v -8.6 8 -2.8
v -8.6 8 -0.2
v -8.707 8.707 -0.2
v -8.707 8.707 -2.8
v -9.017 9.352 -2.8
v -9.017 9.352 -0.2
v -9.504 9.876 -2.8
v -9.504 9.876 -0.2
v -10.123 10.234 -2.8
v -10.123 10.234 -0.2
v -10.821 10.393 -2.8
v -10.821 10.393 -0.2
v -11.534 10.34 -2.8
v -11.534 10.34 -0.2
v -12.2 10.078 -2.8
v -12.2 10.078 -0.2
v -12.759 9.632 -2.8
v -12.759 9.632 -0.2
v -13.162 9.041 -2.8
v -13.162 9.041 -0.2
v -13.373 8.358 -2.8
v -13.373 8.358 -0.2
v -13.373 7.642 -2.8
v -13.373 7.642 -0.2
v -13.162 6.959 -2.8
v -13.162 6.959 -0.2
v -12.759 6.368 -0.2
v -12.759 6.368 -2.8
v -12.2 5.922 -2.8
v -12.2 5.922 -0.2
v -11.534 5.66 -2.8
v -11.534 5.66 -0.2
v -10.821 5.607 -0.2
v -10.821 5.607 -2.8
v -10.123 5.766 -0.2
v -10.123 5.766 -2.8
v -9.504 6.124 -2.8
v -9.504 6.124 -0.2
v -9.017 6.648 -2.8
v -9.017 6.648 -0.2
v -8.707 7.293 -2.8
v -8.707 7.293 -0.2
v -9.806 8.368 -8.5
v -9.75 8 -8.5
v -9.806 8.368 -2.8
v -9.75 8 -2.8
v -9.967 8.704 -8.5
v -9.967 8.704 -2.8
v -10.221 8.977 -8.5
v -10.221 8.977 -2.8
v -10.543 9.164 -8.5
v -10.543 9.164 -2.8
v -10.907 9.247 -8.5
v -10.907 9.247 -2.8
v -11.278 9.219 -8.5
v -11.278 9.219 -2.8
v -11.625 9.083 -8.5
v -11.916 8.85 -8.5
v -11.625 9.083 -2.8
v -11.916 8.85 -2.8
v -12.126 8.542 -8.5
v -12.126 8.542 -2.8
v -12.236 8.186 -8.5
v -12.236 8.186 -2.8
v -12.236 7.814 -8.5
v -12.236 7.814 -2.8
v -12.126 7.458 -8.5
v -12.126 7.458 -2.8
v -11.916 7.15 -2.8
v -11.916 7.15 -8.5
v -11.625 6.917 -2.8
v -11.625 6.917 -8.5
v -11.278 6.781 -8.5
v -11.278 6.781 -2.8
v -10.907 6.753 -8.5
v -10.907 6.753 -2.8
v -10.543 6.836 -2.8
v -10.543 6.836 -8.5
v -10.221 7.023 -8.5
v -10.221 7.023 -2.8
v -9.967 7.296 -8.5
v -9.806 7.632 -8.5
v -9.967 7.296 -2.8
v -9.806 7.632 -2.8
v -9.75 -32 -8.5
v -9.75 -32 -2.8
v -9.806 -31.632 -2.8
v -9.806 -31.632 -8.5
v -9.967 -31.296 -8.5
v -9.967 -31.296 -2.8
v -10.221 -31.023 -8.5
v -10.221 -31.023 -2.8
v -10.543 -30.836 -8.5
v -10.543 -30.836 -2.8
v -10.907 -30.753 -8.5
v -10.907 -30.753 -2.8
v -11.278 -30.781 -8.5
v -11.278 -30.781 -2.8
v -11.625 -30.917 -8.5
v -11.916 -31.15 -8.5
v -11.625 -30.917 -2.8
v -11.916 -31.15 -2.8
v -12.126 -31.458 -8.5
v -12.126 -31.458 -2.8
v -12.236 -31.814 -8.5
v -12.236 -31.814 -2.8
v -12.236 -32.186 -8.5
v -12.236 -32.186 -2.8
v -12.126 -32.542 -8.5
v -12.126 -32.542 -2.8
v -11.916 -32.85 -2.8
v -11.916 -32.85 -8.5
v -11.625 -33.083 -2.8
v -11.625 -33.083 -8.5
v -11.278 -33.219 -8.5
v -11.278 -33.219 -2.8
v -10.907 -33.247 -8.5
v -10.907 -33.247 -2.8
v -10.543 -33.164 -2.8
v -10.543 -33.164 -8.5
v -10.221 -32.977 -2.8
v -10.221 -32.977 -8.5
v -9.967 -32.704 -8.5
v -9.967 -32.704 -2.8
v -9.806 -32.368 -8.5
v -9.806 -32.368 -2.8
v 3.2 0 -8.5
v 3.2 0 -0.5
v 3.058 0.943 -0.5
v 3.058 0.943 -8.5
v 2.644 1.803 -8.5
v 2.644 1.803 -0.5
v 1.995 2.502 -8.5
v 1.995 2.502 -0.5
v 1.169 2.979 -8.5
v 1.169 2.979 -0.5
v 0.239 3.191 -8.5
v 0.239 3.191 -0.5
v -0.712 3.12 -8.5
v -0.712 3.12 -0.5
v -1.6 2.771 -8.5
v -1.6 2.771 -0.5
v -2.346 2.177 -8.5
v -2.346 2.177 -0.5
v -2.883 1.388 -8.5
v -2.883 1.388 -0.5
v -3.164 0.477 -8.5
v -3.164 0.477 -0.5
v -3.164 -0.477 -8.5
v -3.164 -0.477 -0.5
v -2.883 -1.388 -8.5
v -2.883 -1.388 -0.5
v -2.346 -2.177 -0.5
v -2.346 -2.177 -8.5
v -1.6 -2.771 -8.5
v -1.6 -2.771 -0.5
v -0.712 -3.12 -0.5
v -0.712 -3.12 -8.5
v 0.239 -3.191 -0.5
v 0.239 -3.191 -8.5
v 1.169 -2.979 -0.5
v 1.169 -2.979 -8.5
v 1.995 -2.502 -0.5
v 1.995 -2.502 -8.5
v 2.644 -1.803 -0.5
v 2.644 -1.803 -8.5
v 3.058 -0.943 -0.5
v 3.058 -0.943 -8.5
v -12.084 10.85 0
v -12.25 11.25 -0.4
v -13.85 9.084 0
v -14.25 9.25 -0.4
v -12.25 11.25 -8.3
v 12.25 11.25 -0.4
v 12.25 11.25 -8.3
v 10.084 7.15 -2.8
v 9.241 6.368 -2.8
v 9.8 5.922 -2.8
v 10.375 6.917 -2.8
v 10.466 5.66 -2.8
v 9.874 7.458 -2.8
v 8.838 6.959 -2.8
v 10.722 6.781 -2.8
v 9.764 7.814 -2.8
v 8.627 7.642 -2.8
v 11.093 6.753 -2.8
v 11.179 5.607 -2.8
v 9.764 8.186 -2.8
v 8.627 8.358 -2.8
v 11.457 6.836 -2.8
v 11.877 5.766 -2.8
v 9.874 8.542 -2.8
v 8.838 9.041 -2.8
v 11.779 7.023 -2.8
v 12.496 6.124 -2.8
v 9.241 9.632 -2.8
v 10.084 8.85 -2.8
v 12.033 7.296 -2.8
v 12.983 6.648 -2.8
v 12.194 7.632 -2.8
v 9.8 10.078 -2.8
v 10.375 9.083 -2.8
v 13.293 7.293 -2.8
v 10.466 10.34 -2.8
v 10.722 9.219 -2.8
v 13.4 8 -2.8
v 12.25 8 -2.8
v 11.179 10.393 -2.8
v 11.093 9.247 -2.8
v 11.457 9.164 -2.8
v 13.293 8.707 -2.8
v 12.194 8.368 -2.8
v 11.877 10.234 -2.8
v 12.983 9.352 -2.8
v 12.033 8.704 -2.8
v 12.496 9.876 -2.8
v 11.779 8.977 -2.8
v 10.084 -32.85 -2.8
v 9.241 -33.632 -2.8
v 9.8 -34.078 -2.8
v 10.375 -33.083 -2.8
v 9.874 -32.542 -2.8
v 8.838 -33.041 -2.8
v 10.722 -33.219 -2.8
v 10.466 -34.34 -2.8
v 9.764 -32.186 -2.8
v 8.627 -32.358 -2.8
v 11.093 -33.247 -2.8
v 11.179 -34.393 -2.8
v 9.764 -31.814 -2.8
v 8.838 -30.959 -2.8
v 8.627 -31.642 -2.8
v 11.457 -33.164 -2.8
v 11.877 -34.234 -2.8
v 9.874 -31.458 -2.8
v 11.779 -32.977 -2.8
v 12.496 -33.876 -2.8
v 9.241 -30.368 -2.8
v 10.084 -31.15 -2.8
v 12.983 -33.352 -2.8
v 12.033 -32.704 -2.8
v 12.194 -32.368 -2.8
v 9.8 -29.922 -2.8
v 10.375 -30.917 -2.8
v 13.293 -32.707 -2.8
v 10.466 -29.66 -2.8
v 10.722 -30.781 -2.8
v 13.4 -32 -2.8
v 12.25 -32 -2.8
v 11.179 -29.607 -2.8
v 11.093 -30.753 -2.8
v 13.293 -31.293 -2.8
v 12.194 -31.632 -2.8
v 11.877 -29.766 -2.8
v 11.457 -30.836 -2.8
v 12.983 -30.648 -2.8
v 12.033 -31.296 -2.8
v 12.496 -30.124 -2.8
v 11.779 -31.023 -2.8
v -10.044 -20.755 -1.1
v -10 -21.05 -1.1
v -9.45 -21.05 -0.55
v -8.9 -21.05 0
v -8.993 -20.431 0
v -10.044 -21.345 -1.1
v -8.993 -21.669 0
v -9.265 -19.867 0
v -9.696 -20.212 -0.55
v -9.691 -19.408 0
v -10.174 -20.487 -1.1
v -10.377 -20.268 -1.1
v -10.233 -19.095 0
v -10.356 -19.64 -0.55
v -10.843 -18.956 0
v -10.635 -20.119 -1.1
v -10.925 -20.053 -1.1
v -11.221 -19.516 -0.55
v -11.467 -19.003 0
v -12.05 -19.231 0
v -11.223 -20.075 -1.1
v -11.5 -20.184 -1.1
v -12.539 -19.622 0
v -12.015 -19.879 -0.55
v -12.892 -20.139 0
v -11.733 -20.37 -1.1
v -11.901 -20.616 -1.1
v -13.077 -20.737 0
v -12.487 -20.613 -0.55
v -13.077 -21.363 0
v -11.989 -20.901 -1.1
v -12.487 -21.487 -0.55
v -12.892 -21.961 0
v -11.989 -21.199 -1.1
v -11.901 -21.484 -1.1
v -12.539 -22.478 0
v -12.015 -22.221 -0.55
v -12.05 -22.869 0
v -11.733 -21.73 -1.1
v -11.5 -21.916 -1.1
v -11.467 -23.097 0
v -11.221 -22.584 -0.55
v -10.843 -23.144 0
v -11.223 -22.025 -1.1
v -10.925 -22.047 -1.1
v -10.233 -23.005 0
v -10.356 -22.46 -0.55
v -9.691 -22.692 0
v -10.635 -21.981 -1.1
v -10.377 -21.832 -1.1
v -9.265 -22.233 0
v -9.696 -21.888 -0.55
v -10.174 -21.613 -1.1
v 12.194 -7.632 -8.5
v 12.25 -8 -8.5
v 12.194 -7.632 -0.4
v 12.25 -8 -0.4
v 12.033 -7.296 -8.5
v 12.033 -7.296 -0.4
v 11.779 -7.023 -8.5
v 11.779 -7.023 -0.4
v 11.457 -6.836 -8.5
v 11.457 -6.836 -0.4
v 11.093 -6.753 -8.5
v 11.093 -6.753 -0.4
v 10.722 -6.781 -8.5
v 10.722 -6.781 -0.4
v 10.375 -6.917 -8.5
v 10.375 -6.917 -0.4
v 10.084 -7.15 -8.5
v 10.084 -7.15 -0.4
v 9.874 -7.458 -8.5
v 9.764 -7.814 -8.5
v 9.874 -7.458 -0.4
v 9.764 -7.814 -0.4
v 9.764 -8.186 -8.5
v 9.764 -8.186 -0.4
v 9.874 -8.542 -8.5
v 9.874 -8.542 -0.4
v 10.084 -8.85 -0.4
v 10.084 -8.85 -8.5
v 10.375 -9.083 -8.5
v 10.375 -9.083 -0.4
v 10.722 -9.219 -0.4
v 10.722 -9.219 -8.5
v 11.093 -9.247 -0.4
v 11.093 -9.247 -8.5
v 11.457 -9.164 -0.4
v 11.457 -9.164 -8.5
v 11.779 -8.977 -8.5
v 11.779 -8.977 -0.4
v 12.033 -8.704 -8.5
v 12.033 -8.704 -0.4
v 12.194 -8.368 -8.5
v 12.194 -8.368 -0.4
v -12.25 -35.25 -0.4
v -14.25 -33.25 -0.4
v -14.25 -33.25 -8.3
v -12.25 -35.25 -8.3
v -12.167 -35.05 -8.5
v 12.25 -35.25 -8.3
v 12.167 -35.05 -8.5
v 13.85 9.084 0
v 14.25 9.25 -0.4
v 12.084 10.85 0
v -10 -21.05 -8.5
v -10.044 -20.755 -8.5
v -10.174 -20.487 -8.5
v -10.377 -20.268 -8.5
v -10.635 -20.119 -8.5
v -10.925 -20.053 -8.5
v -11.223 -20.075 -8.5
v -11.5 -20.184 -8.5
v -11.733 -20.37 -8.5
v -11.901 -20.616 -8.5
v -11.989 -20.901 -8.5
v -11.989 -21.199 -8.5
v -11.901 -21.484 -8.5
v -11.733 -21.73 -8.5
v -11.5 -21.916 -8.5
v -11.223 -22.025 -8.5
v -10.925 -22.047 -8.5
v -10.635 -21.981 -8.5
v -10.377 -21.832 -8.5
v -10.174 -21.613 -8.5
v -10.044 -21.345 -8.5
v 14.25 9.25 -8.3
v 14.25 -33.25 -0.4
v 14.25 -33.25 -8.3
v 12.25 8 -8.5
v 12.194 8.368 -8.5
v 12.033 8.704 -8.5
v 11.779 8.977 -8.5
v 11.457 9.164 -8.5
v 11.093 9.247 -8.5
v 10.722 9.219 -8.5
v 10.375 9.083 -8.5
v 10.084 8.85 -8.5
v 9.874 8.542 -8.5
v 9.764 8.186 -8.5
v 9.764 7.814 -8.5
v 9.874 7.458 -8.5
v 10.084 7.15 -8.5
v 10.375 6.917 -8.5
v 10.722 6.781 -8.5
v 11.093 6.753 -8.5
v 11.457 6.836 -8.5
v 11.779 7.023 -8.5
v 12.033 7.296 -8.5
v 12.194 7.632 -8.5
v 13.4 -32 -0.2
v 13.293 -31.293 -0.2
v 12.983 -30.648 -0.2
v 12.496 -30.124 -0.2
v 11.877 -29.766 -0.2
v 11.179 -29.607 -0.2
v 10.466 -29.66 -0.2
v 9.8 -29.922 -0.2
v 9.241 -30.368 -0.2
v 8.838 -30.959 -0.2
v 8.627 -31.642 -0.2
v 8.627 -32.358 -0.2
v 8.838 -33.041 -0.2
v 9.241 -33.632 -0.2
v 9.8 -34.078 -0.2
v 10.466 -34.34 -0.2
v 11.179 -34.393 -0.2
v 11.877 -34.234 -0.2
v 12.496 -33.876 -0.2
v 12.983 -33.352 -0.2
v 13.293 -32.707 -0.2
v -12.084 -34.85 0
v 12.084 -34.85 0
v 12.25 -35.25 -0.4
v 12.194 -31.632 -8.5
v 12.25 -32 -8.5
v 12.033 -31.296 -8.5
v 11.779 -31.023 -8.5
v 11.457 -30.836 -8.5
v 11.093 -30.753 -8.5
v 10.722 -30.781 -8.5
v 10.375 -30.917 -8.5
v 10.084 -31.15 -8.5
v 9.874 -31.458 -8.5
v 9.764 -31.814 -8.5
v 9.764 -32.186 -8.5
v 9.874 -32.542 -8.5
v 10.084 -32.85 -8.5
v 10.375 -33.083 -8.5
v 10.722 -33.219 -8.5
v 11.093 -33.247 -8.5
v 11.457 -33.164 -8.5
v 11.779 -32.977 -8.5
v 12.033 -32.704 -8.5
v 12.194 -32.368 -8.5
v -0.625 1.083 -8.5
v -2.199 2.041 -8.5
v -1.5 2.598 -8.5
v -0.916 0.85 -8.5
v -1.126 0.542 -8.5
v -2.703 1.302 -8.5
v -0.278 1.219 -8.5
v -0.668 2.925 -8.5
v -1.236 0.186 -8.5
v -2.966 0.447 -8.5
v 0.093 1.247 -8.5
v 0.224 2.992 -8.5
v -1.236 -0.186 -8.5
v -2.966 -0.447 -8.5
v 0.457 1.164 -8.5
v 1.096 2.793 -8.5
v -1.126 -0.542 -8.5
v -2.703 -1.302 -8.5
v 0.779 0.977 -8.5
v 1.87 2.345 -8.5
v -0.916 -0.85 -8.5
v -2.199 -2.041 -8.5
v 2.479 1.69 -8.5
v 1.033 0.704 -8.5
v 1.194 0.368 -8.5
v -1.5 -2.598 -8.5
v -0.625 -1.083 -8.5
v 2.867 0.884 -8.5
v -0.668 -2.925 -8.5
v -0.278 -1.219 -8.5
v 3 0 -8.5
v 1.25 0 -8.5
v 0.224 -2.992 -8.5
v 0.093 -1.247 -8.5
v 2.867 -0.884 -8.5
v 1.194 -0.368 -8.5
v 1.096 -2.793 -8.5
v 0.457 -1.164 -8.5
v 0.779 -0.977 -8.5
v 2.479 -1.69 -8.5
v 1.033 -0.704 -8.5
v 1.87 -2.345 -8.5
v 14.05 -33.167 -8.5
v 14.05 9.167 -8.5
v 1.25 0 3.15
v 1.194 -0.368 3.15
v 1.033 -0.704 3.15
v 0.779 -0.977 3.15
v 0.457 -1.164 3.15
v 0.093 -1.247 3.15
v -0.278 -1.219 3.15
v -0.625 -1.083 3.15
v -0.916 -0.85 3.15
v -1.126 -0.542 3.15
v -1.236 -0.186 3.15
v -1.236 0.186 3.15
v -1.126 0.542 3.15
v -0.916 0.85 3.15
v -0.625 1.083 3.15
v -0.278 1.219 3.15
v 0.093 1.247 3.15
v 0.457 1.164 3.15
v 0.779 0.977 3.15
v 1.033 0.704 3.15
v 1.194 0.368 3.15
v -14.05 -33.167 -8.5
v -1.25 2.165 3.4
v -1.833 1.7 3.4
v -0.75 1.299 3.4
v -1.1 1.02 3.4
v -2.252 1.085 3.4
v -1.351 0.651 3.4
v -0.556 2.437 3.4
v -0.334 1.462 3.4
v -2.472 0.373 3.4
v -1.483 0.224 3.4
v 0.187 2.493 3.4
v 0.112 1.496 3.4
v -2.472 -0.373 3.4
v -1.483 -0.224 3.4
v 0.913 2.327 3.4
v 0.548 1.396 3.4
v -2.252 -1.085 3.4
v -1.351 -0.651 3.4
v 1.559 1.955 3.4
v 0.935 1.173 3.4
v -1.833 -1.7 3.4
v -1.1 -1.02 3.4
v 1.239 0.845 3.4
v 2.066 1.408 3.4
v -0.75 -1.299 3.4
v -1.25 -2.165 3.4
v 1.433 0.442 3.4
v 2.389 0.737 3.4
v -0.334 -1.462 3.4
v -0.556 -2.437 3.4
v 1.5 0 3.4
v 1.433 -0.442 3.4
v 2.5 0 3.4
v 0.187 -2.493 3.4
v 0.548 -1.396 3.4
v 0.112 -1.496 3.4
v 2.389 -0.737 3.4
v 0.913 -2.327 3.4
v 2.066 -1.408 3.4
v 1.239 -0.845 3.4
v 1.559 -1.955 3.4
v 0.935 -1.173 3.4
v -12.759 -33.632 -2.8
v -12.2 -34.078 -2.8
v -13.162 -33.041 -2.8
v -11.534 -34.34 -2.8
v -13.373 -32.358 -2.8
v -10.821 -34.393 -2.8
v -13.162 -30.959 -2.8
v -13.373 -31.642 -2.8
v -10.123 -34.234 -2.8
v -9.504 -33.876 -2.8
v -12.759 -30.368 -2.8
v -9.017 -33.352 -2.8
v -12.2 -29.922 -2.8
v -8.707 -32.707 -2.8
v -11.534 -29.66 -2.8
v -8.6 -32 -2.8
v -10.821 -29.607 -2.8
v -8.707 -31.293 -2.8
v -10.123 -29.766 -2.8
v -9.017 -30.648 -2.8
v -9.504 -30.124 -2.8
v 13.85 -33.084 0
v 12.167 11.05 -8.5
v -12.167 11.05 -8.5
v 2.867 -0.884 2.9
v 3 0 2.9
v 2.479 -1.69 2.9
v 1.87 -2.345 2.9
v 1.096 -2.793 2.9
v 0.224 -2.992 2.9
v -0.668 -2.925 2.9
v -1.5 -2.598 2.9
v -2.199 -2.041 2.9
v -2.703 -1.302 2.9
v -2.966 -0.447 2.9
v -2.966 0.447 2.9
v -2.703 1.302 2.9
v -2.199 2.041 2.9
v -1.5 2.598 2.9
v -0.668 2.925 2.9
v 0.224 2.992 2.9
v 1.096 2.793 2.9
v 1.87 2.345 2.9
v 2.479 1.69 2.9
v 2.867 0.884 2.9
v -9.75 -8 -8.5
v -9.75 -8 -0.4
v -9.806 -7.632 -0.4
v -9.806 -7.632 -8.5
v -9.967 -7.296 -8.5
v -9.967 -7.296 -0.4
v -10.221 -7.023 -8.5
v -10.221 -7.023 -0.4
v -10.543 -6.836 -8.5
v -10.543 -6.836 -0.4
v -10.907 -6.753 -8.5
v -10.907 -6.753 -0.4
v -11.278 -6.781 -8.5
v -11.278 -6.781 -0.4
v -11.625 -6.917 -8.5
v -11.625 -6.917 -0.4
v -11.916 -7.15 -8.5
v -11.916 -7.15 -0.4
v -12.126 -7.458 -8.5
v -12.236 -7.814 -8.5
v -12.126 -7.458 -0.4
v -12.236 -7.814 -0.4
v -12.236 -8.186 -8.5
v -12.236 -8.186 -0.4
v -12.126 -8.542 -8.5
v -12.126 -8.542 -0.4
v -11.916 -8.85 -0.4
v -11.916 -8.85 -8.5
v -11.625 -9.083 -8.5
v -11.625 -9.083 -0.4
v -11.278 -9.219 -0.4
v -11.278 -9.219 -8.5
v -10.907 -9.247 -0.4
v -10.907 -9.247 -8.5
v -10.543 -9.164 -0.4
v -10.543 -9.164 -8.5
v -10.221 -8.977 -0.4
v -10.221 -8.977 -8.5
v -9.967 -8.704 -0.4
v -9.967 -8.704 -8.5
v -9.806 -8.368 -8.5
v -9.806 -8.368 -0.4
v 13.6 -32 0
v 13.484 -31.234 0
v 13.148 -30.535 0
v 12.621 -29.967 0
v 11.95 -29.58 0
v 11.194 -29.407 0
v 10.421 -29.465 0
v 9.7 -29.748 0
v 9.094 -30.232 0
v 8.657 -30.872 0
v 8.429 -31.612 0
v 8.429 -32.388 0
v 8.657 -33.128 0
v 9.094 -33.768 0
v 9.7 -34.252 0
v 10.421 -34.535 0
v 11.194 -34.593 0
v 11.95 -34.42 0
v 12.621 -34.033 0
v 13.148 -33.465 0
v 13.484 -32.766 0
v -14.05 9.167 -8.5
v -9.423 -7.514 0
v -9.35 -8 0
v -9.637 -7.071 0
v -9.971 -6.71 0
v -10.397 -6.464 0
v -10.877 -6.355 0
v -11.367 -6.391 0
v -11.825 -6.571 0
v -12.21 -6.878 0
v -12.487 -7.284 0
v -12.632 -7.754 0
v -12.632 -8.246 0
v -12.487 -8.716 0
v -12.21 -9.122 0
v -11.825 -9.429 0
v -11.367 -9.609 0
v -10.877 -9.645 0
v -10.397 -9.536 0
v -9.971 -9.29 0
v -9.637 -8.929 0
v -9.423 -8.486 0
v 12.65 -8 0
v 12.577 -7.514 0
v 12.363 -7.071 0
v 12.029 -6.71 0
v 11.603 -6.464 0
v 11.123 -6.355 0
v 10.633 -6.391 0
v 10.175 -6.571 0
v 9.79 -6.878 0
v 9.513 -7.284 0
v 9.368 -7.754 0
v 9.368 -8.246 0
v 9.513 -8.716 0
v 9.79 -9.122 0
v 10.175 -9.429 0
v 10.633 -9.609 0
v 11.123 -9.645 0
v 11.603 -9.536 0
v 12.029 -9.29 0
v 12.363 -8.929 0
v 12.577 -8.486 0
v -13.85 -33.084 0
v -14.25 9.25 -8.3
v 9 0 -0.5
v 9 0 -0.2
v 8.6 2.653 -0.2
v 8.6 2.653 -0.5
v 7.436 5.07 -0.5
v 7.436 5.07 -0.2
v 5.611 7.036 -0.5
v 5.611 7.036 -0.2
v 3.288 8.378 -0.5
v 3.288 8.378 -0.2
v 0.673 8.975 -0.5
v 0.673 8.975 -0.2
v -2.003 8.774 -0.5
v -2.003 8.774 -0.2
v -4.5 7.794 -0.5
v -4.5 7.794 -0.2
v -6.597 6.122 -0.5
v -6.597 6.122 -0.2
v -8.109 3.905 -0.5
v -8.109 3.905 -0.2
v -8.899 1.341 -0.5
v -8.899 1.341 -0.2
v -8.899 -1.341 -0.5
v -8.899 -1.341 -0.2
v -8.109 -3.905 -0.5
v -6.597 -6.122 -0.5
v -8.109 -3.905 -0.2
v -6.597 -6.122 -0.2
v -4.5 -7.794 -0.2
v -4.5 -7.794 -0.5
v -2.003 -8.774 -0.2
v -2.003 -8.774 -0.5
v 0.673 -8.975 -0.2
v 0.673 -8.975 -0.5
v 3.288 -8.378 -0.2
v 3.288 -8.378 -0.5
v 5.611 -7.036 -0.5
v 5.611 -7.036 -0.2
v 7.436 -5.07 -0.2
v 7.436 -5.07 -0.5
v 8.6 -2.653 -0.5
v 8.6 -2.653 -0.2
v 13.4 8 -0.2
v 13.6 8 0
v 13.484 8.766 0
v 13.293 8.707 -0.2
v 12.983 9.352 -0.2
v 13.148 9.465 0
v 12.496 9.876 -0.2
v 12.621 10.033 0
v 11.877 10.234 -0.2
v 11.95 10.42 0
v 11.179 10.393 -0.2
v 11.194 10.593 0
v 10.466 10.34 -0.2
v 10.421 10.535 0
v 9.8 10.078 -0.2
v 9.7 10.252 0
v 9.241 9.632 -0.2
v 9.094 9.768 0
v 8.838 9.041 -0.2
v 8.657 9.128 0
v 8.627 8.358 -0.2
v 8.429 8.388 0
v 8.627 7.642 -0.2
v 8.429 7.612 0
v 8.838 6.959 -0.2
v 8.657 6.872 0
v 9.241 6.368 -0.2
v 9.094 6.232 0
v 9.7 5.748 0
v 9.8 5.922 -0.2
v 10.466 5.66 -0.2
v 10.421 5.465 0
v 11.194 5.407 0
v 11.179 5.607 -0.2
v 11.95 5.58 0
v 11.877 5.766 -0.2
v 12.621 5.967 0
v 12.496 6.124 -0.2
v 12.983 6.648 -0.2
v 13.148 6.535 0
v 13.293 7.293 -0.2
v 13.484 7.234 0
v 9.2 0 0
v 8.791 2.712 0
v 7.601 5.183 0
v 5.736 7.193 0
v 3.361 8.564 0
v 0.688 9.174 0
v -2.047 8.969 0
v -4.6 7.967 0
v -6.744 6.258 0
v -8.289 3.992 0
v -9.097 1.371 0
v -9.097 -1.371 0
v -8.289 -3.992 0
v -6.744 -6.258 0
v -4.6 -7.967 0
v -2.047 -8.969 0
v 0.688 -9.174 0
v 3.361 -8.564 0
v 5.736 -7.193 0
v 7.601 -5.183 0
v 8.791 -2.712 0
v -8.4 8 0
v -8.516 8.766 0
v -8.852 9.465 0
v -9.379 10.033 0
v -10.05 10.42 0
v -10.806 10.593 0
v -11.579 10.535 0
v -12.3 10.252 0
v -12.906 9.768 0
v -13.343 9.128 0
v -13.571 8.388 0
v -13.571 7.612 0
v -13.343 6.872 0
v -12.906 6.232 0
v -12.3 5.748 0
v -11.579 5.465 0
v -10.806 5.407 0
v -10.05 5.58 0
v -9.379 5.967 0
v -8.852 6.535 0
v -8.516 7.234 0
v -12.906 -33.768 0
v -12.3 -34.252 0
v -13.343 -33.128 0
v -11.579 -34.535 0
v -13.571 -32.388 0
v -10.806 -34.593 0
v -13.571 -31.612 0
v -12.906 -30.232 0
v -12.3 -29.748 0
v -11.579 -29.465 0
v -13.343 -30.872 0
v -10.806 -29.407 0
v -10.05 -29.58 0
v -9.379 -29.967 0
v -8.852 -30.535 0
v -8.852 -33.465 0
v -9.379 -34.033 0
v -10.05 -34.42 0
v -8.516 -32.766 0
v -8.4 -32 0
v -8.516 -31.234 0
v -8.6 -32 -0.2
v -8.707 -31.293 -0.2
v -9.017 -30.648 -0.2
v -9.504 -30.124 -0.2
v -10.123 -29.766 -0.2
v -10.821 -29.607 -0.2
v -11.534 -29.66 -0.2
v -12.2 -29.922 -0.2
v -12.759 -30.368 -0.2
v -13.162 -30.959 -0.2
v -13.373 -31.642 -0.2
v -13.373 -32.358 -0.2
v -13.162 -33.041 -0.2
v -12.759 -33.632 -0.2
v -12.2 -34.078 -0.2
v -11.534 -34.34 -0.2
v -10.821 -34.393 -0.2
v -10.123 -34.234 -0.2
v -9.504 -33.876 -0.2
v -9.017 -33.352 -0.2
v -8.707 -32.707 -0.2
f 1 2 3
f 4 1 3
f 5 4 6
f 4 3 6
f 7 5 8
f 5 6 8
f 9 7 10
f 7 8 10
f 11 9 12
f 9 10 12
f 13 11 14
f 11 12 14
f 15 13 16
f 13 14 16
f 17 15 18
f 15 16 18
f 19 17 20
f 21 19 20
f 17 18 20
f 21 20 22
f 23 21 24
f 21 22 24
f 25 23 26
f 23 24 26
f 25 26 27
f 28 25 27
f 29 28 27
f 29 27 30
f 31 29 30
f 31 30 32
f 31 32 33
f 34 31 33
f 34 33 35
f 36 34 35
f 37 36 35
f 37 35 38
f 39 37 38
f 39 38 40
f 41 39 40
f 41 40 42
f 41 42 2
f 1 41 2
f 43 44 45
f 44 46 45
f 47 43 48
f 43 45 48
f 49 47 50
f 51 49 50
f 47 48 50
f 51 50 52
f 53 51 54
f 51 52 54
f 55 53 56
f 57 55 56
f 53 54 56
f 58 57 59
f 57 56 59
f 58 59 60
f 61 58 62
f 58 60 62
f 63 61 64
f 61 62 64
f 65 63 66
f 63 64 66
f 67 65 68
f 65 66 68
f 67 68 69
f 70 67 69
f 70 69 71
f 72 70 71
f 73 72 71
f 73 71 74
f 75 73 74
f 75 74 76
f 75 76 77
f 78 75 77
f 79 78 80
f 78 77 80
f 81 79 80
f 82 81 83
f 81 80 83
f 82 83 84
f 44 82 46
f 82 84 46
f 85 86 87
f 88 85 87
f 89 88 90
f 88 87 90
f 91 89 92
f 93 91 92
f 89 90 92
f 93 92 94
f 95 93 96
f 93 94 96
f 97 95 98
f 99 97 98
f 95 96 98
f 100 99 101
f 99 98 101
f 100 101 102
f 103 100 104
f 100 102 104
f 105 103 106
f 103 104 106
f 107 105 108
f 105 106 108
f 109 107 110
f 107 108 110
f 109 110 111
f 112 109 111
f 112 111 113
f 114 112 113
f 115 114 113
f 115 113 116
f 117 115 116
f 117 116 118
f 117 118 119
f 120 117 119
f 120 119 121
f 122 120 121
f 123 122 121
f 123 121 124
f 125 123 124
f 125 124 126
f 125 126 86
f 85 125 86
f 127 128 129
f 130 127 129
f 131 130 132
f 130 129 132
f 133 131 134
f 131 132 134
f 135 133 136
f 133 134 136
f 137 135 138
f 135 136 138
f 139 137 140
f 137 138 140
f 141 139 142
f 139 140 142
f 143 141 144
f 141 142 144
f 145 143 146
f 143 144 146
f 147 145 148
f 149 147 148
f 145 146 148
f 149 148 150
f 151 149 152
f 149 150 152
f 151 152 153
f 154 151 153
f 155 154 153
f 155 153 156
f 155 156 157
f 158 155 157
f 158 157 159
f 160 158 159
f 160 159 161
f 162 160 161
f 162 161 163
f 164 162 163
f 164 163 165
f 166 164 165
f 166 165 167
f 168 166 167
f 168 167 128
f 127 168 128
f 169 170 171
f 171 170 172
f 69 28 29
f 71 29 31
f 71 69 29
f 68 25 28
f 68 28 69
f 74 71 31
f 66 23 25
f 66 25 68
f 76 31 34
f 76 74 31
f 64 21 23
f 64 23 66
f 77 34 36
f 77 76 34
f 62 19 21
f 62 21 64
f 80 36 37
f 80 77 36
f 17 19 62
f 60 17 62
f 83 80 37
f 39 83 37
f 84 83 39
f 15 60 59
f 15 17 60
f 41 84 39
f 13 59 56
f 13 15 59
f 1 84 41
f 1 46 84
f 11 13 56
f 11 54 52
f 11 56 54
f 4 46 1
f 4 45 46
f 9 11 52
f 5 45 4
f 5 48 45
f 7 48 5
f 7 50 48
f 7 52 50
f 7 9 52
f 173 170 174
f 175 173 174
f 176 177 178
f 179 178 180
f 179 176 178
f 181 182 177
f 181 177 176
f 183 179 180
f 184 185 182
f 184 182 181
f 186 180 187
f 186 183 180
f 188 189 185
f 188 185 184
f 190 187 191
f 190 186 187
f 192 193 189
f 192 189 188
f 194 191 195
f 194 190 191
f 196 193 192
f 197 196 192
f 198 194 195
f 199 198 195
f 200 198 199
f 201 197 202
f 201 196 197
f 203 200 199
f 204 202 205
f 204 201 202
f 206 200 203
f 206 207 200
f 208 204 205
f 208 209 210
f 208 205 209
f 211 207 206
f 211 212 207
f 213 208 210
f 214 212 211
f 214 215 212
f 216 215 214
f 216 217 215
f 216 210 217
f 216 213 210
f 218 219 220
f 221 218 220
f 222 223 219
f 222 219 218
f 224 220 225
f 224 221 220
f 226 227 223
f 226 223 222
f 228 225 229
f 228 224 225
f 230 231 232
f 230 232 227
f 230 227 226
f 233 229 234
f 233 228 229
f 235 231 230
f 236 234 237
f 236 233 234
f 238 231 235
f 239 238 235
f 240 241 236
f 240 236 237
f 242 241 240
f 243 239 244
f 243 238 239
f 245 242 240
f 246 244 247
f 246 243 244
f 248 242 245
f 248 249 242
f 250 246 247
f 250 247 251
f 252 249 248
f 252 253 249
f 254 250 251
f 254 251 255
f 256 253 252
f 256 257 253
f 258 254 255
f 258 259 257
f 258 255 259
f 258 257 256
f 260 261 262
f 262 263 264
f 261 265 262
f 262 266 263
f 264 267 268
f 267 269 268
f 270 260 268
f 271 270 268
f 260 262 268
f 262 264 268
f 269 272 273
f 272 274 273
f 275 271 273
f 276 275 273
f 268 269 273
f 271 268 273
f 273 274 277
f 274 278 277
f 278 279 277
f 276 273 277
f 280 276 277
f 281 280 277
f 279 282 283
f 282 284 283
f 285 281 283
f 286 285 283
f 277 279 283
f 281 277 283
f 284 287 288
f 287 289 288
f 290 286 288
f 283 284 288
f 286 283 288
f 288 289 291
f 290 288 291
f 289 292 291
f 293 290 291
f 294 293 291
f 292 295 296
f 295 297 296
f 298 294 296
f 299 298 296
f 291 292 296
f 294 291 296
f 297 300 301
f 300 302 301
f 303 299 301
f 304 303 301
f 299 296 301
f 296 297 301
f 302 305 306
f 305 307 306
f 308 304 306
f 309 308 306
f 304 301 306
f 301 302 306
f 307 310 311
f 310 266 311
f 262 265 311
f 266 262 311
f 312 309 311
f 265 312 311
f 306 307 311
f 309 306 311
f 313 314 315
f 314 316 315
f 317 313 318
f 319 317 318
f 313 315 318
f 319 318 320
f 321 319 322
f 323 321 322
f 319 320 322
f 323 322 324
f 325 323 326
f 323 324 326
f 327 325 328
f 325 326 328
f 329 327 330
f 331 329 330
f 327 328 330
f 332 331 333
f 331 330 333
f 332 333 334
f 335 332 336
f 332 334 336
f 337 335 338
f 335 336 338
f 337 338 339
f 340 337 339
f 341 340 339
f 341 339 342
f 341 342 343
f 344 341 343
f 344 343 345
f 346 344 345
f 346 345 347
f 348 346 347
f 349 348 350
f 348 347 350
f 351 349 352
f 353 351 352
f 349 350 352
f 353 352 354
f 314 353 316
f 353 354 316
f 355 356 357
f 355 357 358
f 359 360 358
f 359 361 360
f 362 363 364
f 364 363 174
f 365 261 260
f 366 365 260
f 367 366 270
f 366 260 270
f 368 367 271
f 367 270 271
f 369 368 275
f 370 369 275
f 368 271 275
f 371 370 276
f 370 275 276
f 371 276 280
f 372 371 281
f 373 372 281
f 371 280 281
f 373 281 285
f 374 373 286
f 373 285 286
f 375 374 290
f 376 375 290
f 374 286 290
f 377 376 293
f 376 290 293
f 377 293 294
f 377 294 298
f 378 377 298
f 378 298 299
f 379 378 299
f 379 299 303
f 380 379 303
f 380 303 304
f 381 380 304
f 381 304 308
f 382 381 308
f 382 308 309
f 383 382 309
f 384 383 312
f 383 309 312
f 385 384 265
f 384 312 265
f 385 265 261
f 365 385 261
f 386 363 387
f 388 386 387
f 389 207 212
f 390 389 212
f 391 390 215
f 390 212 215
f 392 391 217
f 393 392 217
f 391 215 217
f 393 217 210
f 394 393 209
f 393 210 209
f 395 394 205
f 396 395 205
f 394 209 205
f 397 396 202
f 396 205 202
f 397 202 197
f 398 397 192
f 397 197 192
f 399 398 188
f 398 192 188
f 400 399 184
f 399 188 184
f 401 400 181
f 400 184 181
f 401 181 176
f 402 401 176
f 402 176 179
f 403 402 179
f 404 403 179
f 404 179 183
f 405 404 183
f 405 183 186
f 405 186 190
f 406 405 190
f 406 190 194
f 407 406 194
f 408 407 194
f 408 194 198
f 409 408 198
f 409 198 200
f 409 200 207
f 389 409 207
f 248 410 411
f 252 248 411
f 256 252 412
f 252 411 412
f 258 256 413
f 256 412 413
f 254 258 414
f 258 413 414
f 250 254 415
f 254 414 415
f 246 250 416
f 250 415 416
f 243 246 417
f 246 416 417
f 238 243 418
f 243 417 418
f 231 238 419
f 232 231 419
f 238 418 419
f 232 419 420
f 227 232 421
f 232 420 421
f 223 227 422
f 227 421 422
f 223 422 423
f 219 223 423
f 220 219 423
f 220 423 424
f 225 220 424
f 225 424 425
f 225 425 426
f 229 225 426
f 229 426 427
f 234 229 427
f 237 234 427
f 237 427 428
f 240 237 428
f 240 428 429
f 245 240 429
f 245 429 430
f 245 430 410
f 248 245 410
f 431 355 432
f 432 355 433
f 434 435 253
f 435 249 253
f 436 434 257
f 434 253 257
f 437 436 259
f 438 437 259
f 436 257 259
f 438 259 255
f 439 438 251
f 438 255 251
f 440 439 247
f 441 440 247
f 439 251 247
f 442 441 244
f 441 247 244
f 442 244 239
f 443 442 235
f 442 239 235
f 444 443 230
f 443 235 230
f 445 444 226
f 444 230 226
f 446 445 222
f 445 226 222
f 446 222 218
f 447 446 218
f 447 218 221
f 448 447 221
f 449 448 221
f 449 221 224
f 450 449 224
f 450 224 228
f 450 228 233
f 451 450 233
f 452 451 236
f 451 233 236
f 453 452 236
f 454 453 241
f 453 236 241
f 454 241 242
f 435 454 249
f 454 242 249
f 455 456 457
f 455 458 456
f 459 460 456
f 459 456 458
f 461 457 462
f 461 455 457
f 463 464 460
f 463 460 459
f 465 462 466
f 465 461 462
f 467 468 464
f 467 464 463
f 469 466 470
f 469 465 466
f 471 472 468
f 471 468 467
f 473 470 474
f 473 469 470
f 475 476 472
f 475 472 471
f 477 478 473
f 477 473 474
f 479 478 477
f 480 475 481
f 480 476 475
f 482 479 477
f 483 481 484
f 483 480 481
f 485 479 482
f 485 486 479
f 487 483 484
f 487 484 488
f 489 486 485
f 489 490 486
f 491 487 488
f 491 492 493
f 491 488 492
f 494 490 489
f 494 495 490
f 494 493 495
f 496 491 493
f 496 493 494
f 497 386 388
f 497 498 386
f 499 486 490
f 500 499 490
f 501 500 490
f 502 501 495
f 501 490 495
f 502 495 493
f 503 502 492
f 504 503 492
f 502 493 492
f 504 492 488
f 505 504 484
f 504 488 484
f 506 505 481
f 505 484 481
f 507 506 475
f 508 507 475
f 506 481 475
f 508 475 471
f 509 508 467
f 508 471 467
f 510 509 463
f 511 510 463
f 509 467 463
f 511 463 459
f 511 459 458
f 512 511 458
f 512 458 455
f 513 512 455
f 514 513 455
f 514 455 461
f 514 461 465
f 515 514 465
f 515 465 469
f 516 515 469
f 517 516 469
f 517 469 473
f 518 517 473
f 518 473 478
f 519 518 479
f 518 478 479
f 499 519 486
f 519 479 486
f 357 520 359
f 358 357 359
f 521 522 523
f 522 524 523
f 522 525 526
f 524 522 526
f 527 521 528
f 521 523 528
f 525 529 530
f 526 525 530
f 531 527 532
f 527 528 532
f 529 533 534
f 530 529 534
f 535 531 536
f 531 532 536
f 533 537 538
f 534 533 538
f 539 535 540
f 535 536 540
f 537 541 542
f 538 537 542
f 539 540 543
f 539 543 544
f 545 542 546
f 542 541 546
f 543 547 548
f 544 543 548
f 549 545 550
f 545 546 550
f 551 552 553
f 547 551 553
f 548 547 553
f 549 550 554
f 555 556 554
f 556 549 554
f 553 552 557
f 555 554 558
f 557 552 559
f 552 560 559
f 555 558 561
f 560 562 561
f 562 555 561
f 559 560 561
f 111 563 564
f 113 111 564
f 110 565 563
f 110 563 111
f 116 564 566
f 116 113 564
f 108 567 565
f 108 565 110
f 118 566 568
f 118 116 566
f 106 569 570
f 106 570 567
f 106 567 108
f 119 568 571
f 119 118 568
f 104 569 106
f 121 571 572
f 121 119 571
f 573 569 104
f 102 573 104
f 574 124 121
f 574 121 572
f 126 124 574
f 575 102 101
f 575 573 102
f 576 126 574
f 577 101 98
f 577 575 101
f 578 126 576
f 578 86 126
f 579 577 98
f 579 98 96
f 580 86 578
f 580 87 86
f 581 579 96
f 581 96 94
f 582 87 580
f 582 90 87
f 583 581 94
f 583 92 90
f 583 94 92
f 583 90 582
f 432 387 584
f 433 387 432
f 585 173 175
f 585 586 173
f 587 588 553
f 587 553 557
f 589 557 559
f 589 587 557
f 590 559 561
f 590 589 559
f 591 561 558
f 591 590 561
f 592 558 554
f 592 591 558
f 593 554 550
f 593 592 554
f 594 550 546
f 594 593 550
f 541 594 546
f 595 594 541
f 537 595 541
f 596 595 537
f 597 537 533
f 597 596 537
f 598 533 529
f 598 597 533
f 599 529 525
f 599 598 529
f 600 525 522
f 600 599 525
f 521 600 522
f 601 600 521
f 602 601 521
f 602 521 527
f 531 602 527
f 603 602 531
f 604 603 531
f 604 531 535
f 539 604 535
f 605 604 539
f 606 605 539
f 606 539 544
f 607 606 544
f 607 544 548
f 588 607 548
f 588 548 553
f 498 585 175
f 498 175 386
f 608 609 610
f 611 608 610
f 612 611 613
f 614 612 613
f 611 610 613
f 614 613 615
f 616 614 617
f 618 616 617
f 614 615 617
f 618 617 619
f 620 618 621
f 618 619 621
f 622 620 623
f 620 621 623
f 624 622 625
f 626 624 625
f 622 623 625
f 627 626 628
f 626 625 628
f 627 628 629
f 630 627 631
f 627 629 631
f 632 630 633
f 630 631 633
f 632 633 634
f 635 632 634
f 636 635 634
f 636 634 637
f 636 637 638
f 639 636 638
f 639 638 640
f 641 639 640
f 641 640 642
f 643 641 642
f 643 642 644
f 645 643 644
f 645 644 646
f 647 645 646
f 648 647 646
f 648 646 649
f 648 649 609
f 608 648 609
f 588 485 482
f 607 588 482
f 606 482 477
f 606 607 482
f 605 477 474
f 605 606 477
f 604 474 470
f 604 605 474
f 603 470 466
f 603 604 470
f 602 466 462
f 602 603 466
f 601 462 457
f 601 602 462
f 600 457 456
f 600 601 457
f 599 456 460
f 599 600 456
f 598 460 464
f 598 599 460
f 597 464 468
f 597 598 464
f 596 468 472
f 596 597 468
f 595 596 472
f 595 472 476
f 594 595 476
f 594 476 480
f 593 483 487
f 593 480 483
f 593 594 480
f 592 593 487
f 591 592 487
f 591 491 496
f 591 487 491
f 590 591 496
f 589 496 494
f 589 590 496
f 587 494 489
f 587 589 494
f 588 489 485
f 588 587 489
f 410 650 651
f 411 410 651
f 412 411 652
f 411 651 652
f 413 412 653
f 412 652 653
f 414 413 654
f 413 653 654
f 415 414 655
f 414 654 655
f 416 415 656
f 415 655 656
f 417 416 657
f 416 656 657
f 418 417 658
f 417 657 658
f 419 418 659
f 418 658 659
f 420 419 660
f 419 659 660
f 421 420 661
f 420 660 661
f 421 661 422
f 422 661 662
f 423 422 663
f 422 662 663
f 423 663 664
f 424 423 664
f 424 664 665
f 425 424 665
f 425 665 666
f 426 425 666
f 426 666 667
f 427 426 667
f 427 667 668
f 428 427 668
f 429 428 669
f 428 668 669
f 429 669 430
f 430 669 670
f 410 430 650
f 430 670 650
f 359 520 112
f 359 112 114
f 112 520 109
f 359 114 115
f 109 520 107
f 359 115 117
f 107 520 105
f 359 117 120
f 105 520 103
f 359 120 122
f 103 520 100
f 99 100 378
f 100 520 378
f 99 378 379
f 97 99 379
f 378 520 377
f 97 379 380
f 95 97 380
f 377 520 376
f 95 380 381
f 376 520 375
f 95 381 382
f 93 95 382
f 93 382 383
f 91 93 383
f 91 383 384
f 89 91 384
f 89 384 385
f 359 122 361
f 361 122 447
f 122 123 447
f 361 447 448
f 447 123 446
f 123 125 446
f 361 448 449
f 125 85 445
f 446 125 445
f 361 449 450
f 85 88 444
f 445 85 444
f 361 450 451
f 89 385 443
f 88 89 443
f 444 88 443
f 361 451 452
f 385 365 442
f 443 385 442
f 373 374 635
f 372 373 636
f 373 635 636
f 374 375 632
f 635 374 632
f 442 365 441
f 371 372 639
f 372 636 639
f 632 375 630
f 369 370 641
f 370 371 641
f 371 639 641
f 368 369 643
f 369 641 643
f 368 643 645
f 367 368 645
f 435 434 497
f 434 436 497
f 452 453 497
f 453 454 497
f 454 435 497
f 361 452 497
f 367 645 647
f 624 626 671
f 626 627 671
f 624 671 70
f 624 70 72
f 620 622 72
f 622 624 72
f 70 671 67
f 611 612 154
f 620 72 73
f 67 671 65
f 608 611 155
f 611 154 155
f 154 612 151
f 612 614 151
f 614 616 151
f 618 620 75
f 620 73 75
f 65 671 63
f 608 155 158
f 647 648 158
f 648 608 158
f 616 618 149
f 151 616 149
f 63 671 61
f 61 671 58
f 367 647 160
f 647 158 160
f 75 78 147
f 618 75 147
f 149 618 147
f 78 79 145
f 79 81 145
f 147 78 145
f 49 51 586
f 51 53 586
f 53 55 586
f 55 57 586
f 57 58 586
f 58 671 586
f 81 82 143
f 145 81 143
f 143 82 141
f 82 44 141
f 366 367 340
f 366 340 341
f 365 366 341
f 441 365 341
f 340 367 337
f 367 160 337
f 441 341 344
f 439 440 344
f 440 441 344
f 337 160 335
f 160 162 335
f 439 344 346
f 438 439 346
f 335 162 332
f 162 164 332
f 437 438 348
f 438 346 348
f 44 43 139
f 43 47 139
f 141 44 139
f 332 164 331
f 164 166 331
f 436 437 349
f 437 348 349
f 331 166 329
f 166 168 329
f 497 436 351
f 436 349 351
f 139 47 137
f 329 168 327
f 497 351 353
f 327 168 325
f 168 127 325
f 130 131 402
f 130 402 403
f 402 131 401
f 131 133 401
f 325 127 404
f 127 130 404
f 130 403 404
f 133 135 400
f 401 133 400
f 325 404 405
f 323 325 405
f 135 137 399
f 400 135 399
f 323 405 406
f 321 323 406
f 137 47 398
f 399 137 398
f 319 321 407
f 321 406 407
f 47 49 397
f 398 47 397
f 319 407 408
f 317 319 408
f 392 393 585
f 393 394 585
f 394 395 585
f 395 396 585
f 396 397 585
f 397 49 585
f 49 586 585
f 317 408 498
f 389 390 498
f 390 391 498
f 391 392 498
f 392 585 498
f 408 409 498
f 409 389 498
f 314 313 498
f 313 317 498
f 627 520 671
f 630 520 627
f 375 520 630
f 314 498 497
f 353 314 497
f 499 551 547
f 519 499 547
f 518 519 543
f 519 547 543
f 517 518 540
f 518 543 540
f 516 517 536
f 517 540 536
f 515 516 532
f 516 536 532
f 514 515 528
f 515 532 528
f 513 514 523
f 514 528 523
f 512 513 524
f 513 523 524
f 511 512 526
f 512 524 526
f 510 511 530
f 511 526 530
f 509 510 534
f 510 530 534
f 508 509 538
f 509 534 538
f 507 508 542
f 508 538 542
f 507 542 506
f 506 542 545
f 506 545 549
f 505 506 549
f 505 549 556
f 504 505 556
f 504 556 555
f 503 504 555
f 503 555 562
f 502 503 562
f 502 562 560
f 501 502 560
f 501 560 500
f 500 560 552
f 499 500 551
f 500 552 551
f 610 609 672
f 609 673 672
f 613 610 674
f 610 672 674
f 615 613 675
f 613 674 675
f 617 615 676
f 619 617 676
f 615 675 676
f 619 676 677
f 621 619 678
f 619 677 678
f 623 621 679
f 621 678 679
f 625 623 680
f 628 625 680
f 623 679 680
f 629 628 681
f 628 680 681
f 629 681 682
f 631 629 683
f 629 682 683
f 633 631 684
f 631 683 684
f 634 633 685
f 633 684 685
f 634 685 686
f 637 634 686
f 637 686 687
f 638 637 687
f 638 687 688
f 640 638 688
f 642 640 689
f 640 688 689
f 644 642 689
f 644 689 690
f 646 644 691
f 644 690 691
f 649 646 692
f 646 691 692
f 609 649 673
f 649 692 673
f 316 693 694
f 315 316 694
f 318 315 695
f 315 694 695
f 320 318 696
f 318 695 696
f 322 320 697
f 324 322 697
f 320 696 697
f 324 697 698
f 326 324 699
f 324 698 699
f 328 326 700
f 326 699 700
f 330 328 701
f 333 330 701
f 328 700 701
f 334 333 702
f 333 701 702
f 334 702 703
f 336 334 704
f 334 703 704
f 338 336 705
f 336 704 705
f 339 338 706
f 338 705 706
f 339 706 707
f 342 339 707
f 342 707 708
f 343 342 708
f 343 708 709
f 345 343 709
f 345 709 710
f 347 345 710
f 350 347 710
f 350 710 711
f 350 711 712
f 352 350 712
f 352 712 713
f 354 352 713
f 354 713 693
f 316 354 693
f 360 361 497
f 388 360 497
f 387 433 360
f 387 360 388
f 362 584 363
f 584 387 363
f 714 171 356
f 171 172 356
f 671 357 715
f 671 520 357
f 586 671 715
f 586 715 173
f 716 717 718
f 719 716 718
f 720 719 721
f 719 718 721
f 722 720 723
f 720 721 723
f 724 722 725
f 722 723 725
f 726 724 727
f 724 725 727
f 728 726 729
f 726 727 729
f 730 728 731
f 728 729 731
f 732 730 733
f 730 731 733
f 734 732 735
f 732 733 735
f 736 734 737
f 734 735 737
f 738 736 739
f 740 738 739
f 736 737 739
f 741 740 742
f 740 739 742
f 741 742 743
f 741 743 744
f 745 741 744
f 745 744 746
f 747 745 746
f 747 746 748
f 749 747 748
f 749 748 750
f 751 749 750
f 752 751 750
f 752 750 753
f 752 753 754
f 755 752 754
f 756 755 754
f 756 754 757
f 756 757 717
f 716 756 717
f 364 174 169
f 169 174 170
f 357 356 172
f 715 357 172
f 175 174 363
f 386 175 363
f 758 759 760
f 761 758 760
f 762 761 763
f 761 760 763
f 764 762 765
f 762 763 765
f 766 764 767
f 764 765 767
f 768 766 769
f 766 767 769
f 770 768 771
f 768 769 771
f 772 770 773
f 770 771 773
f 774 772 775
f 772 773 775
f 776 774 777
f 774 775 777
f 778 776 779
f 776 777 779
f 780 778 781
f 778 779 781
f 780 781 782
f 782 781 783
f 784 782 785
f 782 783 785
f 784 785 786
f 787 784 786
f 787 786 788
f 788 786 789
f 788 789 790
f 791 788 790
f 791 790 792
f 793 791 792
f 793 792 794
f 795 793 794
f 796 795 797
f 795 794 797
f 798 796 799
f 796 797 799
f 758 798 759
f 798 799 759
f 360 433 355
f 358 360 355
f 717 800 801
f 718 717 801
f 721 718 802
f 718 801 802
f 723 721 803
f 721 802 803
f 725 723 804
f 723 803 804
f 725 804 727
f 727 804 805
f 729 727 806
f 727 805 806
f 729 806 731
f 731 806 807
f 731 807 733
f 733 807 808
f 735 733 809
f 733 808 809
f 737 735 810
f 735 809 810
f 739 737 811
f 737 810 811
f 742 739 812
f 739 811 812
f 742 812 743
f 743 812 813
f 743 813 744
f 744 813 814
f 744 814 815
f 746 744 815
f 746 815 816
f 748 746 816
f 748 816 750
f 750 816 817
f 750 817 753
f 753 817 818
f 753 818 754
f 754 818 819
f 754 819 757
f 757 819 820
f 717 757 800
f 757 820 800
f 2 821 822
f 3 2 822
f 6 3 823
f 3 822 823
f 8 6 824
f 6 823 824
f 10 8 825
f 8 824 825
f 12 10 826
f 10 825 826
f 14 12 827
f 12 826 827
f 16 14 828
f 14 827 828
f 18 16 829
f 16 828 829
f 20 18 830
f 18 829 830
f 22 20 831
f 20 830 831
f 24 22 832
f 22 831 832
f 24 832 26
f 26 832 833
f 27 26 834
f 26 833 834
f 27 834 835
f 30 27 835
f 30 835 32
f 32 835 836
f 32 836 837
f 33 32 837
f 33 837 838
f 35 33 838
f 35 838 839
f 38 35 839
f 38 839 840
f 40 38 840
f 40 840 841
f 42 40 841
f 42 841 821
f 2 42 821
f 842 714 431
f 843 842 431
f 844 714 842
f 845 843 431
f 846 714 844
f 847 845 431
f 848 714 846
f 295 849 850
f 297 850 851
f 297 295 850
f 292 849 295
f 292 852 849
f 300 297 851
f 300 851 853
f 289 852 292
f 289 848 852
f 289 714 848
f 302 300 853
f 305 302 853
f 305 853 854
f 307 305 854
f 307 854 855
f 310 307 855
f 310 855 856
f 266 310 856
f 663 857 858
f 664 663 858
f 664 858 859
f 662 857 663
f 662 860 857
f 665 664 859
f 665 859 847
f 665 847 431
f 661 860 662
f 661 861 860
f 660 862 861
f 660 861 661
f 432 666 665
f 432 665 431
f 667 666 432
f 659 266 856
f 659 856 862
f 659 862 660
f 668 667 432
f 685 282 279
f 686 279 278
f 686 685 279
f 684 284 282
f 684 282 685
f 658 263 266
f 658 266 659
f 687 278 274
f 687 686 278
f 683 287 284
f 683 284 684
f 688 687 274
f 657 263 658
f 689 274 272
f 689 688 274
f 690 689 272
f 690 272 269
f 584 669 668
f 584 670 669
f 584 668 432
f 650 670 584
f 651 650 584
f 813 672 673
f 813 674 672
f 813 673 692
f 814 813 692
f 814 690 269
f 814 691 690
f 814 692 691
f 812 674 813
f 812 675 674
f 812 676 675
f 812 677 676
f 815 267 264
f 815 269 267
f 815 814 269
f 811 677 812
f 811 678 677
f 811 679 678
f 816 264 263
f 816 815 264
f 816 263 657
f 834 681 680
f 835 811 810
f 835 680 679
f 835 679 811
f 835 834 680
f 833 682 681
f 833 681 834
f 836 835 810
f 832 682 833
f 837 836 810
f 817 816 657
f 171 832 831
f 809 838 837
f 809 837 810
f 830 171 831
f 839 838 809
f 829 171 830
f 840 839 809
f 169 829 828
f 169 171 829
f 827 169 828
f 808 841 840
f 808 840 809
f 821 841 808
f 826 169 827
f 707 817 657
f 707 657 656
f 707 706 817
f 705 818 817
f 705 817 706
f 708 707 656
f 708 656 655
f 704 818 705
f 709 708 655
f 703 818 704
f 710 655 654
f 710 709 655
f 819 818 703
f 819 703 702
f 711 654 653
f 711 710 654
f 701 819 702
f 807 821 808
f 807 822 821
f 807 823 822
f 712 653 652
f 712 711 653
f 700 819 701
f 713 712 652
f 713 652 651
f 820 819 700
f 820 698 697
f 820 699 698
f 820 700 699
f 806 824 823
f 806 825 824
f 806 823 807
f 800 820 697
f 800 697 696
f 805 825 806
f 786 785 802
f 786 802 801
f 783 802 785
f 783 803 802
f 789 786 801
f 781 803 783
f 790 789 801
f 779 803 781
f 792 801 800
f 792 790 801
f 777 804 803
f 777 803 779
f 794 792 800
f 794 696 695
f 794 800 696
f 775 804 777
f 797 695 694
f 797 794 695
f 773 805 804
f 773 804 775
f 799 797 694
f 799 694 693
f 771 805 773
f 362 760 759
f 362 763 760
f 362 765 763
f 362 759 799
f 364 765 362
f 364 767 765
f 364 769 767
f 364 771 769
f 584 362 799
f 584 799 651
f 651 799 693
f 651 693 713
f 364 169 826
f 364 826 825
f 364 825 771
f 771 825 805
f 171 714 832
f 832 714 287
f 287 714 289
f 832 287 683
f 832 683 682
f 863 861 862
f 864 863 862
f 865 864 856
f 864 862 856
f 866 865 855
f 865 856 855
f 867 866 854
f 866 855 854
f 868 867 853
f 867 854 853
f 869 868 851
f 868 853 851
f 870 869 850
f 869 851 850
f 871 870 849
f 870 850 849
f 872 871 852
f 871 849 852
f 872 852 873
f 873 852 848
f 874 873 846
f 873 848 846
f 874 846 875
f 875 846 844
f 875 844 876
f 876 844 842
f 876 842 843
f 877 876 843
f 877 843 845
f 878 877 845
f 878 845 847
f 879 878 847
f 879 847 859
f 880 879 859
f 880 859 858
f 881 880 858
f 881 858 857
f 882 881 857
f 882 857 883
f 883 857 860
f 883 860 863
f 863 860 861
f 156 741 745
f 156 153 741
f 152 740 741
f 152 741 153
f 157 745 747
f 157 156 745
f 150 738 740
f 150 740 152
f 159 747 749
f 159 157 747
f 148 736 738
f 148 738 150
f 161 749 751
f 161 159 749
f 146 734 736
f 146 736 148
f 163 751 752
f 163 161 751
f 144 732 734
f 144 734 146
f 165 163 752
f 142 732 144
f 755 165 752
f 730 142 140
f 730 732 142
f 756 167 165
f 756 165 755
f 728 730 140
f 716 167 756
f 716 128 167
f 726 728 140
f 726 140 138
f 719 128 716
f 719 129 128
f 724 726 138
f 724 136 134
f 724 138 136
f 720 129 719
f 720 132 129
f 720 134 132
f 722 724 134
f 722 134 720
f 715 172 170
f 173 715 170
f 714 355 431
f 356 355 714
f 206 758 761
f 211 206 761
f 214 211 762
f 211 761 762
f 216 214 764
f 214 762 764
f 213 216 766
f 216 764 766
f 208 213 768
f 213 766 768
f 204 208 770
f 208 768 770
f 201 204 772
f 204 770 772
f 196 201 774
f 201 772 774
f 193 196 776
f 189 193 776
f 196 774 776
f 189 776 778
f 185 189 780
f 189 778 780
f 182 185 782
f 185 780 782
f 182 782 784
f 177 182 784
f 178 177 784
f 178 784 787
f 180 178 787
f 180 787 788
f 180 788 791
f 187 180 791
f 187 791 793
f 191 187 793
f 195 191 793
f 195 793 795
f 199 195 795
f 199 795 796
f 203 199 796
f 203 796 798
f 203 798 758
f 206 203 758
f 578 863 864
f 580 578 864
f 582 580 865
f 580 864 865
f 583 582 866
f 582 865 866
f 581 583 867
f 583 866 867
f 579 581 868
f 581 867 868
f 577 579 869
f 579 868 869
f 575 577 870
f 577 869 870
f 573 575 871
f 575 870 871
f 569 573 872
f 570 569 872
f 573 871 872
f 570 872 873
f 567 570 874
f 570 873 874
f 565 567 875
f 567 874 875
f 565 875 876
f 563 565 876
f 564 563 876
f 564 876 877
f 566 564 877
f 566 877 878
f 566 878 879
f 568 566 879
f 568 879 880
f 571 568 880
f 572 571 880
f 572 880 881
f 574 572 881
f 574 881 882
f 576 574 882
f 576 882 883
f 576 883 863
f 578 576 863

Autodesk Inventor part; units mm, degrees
ref_plane "YZ Plane" through (0, 0, 0) normal (1, 0, 0) x (0, 1, 0)
ref_plane "XZ Plane" through (0, 0, 0) normal (0, 1, 0) x (-1, 0, 0)
ref_plane "XY Plane" through (0, 0, 0) normal (0, 0, 1) x (1, 0, 0)
sketch "スケッチ1" plane through (0, 0, 0) normal (0, 0, 1) x (1, 0, 0)
  line L0 (-12.25, 11.25) -> (12.25, 11.25)
  line L1 (14.25, 9.25) -> (14.25, -33.25)
  line L2 (12.25, -35.25) -> (-12.25, -35.25)
  line L3 (-14.25, -33.25) -> (-14.25, 9.25)
  circle A0 centre (11, 8) radius 1.25
  circle A1 centre (11, -8) radius 1.25
  circle A2 centre (11, -32) radius 1.25
  line L4 (0, 0) -> (0, 13.0678) construction
  circle A3 centre (-11, 8) radius 1.25
  circle A4 centre (-11, -8) radius 1.25
  circle A5 centre (-11, -32) radius 1.25
  line L5 (-26.5405, 0) -> (16.6243, 0) construction
  line L6 (11, 8) -> (11, -8) construction
  line L7 (11, -8) -> (11, -32) construction
  circle A6 centre (-11, -21.05) radius 1
  line L8 (-11, -21.05) -> (-11, -32) construction
  line L9 (-14.25, 9.25) -> (-12.25, 11.25)
  line L10 (12.25, 11.25) -> (14.25, 9.25)
  line L11 (12.25, -35.25) -> (14.25, -33.25)
  line L12 (-14.25, -33.25) -> (-12.25, -35.25)
  circle A7 centre (0, 0) radius 3.2
  point P0 (-14.25, 11.25)
  point P1 (14.25, -35.25)
  point P2 (14.25, 11.25)
  point P3 (-14.25, -35.25)
  dimension "d0" = 2.5
  dimension "d1" = 28.5
  dimension "d3" = 46.5
  dimension "d4" = 8
  dimension "d5" = 8
  dimension "d6" = 22
  dimension "d7" = 40
  dimension "d8" = 2
  dimension "d9" = 14.2
  dimension "d10" = 11.25
  dimension "d11" = 2
  dimension "d12" = 2
  dimension "d13" = 2
  dimension "d14" = 2
  dimension "d15" = 2
  dimension "d16" = 2
  dimension "d17" = 2
  dimension "d18" = 2
  dimension "d41" = 6.4
extrude "押し出し1" add sketch "スケッチ1" against normal blind 8.5
chamfer "面取り1" distance 1.1 angle 45 1 edges at (-12, -21.05, 0)
sketch "スケッチ2" plane through (0, 0, 0) normal (0, 0, 1) x (1, 0, 0)
  circle A0 centre (-11, 8) radius 2.4
  circle A1 centre (11, 8) radius 2.4
  circle A2 centre (11, -32) radius 2.4
  circle A3 centre (-11, -32) radius 2.4
  circle A4 centre (-11, 8) radius 1.25 construction
  circle A5 centre (11, 8) radius 1.25 construction
  circle A6 centre (11, -32) radius 1.25 construction
  circle A7 centre (-11, -32) radius 1.25 construction
  point P0 (0, 0)
  dimension "d25" = 4.8
extrude "押し出し2" cut sketch "スケッチ2" against normal blind 2.8
sketch "スケッチ3" plane through (0, 0, 0) normal (0, 0, 1) x (1, 0, 0)
  circle A0 centre (0, 0) radius 9
  dimension "d40" = 18
extrude "押し出し3" cut sketch "スケッチ3" against normal blind 0.5
chamfer "面取り2" distance 0.4 angle 45 10 edges at (-14.25, -12, 0) (-13.25, 10.25, 0) (0, 11.25, 0) (13.25, 10.25, 0) (14.25, -12, 0) (13.25, -34.25, 0) (0, -35.25, 0) (-13.25, -34.25, 0) (-12.25, -8, 0) (9.75, -8, 0)
chamfer "面取り3" distance 0.2 angle 45 13 edges at (-13.4, 8, 0) (8.6, 8, 0) (-9, 0, 0) (8.6, -32, 0) (-13.4, -32, 0) (-14.25, -12, -8.5) (-13.25, -34.25, -8.5) (0, -35.25, -8.5) (13.25, -34.25, -8.5) (14.25, -12, -8.5) (13.25, 10.25, -8.5) (0, 11.25, -8.5) (-13.25, 10.25, -8.5)
sketch "スケッチ5" plane through (0, 0, 0) normal (0, 1, 0) x (-1, 0, 0)
  line L0 (-1.25, -8.5) -> (-3, -8.5)
  line L1 (-3, -8.5) -> (-3, 2.9)
  line L2 (-2.5, 3.4) -> (-1.5, 3.4)
  line L3 (-1.25, 3.15) -> (-1.25, -8.5)
  line L4 (12.1672, -8.5) -> (-12.1672, -8.5) construction
  line L5 (-12.0843, 0) -> (12.0843, 0) construction
  line L6 (0, 0) -> (0, -12.5423) construction
  line L7 (-3, 2.9) -> (-2.5, 3.4)
  line L8 (-1.5, 3.4) -> (-1.25, 3.15)
  point P0 (-3, 3.4)
  point P1 (-1.25, 3.4)
  dimension "d42" = 2.5
  dimension "d43" = 6
  dimension "d44" = 3.4
  dimension "d45" = 0.5
  dimension "d46" = 0.5
  dimension "d47" = 0.25
  dimension "d48" = 0.25
revolve "回転1" add sketch "スケッチ5" angle 360 about axis through (0, 0, 0) along (0, 0, -1)
equation "\"d12\" = d11"
equation "\"d13\" = d11"
equation "\"d14\" = d13"
equation "\"d15\" = d11"
equation "\"d16\" = d15"
equation "\"d17\" = d11"
equation "\"d18\" = d17"
equation "\"d46\" = d45"
equation "\"d48\" = d47"
properties part number "XM430_HOUSING_TOP"
